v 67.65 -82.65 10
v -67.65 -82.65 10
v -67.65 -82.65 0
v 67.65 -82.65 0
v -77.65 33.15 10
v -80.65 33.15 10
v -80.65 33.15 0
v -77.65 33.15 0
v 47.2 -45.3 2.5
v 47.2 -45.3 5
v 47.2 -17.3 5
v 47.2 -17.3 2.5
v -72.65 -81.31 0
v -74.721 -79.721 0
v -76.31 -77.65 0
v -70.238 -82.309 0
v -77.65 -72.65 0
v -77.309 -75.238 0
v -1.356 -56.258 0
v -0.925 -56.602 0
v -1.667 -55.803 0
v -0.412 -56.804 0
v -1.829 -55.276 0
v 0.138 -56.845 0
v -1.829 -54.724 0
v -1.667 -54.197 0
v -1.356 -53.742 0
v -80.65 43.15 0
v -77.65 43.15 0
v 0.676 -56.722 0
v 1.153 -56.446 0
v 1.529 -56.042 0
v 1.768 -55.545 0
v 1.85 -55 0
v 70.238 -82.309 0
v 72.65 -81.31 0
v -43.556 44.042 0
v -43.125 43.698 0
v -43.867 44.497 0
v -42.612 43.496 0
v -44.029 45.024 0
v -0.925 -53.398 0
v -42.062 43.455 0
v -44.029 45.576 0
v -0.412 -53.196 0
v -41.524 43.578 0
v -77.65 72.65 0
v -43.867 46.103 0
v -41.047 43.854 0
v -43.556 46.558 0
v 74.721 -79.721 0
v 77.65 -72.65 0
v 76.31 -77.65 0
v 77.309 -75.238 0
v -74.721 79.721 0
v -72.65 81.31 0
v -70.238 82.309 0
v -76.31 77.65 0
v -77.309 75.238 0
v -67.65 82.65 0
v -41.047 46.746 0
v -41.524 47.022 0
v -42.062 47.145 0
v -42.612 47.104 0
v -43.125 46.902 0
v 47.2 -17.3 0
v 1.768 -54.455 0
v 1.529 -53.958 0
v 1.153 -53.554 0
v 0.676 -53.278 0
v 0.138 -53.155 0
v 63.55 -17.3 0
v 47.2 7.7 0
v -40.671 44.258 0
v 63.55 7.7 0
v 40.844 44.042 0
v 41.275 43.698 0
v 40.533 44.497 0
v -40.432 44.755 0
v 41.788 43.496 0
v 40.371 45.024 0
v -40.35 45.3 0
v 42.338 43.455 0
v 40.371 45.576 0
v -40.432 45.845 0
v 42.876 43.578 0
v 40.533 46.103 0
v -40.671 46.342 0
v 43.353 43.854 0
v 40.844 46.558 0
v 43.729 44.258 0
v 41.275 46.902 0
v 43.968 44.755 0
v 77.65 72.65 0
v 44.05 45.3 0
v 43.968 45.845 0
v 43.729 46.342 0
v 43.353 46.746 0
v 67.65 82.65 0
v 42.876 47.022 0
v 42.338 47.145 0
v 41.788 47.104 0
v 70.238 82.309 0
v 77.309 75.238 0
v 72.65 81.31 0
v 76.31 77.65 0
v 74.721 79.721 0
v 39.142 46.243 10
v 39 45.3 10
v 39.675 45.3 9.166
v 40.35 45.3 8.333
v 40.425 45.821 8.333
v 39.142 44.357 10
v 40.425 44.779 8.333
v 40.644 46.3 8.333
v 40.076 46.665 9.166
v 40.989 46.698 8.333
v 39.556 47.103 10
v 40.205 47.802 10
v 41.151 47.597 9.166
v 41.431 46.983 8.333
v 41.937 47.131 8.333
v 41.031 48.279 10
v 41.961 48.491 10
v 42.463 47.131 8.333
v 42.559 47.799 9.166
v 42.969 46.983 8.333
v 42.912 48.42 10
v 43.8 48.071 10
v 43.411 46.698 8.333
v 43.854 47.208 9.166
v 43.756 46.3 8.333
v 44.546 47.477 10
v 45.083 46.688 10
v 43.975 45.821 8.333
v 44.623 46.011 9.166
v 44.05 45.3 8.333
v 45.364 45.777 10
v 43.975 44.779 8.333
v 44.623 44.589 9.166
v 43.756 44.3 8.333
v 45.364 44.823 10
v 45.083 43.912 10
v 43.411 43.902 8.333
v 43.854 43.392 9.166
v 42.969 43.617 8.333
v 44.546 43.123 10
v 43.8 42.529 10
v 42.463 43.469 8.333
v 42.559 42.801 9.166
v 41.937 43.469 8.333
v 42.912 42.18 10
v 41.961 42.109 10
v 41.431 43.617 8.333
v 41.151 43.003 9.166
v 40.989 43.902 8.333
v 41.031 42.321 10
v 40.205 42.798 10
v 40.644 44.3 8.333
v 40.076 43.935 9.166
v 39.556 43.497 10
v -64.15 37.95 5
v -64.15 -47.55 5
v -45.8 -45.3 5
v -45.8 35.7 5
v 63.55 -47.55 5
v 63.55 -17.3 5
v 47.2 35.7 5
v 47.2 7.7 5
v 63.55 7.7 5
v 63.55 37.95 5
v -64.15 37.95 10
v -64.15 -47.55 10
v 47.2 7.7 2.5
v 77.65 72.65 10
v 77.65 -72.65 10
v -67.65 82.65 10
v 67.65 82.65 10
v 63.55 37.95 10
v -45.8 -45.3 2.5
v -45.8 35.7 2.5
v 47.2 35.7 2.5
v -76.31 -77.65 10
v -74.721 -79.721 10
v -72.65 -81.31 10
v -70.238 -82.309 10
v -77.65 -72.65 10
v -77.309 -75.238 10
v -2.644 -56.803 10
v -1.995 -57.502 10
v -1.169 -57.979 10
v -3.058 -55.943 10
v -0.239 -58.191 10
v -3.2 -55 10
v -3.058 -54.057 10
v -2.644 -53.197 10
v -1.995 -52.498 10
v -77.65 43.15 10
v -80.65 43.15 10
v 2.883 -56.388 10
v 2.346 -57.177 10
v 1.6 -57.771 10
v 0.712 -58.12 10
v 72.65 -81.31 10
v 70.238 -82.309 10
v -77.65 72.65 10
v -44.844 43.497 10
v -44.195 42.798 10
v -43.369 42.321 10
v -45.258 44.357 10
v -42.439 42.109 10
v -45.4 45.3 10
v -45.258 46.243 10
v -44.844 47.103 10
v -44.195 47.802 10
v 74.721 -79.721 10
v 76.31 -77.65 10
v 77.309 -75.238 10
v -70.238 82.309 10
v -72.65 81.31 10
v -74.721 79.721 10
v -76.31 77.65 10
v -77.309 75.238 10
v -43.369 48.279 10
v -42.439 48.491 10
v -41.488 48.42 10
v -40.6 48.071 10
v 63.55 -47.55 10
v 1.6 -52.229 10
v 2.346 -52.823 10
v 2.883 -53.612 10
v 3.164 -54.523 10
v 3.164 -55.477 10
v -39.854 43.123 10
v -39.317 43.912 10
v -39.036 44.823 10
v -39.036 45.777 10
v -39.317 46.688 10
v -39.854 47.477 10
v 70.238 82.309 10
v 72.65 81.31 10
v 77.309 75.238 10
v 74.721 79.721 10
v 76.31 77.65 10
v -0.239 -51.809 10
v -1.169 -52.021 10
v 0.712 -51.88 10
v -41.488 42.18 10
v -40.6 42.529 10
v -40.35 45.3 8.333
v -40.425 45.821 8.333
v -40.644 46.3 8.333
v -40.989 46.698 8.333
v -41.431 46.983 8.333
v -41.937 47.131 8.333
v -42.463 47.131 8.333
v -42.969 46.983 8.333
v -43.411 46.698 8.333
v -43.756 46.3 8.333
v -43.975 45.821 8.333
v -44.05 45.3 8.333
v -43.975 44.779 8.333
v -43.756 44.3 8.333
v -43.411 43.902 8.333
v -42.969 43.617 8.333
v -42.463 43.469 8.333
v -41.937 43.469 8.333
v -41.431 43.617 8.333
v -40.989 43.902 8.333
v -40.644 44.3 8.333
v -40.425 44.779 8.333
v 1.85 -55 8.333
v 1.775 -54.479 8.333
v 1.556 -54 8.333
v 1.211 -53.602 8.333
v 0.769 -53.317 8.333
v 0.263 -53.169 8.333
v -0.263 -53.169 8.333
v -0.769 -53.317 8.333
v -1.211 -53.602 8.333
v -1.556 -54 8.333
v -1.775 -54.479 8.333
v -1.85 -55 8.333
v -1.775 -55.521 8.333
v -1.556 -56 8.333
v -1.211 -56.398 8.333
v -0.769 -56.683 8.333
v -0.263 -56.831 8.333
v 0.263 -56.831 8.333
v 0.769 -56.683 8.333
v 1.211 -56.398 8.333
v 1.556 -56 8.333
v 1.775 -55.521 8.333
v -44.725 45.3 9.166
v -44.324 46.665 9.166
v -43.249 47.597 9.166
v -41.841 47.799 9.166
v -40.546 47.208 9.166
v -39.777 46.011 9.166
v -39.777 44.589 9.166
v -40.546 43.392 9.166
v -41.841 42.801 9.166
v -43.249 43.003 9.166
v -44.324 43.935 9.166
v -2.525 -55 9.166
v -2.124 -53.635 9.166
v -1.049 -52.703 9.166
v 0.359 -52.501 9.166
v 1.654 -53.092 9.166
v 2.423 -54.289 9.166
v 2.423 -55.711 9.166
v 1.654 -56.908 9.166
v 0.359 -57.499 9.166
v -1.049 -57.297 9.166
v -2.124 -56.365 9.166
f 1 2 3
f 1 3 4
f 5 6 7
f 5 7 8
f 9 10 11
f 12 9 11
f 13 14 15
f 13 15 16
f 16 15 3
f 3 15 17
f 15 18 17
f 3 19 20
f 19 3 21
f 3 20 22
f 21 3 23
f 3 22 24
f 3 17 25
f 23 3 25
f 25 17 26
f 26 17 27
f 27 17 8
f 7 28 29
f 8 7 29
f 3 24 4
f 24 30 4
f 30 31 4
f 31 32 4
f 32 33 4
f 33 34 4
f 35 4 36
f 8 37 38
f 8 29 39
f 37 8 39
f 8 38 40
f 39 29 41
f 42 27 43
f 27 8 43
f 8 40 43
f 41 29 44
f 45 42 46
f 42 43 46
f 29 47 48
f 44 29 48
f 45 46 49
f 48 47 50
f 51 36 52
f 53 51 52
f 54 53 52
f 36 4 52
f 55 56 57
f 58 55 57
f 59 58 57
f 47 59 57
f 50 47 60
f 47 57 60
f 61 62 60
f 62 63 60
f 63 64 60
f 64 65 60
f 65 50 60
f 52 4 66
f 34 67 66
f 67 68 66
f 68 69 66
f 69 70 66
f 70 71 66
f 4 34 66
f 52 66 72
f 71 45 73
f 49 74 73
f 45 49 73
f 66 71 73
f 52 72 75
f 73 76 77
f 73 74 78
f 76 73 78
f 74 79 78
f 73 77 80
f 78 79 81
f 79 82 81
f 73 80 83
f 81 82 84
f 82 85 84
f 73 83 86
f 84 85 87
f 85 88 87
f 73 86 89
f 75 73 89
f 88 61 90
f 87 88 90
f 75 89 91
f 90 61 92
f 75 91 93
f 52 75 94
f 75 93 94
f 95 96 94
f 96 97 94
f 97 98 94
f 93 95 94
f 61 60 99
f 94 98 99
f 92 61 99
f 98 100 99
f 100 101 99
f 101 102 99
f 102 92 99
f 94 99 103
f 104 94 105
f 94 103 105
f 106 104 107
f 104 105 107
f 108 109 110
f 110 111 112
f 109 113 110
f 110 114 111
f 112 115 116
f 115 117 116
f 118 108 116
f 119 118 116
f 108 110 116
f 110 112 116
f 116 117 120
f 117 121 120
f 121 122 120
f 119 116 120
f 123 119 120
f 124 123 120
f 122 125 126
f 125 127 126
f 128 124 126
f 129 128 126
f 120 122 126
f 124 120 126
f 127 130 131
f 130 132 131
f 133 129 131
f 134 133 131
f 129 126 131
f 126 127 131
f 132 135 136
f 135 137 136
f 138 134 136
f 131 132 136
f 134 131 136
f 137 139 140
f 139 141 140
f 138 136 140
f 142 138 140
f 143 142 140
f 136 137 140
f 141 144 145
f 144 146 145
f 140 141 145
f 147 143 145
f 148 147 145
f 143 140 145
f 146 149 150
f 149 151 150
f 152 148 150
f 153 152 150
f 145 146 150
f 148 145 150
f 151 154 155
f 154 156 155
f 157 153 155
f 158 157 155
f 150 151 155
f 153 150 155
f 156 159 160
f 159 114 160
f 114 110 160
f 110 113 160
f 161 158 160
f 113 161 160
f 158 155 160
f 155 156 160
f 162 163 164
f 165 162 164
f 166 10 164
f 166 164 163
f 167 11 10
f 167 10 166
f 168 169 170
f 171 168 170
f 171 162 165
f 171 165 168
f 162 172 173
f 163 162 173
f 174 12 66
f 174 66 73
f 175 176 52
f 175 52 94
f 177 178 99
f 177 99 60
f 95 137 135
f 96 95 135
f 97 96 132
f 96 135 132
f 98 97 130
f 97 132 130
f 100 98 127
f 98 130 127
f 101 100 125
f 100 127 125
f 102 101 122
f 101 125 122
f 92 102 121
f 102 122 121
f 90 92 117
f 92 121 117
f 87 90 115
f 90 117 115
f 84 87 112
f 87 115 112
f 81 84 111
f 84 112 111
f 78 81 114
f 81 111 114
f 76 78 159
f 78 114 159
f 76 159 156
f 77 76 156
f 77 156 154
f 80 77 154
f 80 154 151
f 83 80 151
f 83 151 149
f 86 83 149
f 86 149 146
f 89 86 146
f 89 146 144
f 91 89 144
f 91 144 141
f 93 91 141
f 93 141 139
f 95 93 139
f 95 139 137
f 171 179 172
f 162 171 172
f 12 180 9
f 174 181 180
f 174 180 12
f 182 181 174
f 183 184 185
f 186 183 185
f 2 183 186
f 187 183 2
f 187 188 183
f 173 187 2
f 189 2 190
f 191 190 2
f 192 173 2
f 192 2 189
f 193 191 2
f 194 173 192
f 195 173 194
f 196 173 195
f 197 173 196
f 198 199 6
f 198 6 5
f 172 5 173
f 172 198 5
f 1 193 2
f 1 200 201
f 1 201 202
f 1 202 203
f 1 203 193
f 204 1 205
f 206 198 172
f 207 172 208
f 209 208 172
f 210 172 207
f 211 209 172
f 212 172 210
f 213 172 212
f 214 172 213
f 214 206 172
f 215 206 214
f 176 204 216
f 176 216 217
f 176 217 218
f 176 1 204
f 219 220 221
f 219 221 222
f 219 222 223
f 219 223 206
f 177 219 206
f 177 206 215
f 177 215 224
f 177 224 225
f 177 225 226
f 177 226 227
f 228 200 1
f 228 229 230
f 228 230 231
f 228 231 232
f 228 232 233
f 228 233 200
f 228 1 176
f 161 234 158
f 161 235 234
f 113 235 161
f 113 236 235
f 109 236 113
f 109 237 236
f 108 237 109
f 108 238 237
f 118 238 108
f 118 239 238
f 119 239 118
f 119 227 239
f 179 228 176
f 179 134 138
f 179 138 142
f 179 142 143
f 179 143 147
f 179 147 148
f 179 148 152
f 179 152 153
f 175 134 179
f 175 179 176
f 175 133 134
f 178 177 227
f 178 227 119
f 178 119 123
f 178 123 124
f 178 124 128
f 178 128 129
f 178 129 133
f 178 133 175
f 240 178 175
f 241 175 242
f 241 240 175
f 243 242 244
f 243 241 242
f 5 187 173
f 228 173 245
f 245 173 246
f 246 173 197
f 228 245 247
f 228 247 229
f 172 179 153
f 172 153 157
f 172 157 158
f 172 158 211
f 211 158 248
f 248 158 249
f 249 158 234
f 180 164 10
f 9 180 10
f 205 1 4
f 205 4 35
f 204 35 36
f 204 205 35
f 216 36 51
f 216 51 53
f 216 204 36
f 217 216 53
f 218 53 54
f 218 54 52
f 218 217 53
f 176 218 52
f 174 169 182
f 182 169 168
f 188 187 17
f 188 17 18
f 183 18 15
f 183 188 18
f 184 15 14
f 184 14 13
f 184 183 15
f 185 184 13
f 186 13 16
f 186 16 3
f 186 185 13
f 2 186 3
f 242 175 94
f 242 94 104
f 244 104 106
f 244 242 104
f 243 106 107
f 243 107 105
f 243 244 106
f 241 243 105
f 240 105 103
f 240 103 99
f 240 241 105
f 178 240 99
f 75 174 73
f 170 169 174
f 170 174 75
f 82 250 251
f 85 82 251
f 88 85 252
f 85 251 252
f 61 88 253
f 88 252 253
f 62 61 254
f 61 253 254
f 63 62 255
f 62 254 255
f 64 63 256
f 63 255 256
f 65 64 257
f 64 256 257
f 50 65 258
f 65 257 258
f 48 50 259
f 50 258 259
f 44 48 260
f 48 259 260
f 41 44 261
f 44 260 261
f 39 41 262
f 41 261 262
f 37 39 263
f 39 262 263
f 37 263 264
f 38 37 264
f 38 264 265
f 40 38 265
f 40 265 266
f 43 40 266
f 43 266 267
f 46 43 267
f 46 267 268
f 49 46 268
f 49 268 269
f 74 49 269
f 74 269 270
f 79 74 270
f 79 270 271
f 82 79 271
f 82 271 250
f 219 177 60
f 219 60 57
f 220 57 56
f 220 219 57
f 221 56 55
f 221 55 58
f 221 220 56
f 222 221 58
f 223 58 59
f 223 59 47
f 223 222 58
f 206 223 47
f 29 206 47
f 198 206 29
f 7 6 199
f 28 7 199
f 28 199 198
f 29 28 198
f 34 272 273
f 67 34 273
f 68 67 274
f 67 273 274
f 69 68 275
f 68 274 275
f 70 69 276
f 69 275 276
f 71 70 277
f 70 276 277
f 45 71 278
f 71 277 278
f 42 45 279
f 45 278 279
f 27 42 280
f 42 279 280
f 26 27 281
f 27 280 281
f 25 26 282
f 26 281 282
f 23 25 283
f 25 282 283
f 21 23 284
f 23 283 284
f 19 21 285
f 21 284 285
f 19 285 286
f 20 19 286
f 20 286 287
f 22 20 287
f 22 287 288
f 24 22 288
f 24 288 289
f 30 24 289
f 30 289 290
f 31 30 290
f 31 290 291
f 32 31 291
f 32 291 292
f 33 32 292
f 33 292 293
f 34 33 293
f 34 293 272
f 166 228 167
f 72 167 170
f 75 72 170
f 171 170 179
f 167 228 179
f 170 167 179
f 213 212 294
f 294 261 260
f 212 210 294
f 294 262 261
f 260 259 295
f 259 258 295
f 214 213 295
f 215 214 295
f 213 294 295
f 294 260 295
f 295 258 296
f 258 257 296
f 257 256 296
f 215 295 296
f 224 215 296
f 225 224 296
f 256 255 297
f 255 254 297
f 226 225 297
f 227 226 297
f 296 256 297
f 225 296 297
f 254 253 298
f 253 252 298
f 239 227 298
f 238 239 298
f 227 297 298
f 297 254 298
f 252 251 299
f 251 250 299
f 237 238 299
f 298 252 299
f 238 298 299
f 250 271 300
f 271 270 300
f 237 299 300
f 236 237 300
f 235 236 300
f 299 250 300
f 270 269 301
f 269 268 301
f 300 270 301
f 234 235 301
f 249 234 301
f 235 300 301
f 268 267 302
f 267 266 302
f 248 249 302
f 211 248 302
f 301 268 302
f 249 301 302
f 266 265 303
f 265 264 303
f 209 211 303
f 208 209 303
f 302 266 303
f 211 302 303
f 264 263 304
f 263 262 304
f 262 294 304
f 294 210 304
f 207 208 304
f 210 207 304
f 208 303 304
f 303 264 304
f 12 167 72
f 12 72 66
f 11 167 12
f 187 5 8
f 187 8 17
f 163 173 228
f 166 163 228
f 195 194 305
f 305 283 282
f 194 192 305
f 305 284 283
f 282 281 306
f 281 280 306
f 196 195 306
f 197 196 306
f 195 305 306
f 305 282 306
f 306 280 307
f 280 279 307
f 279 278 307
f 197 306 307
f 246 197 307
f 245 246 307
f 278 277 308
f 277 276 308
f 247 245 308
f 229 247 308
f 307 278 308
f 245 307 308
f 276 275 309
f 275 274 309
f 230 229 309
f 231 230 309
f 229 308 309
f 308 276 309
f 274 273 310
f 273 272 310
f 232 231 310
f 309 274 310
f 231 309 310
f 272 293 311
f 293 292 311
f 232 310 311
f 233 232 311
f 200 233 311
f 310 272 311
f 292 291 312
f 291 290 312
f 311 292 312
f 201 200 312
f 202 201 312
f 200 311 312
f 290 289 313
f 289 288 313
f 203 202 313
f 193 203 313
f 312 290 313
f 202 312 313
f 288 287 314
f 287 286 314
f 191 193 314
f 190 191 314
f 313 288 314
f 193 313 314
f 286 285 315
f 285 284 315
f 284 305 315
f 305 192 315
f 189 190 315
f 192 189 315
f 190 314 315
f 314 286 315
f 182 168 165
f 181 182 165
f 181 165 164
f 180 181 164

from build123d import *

# Parameters (mm, degrees)
F2_R           = 1.85
F2_W           = 3
F2_H           = 10
F3_DEPTH       = 10
F4_DEPTH       = 5
F5_DEPTH       = 7.5
F6_D           = 3.7
F6_CSINK_D     = 6.4
F6_CSINK_ANGLE = 78


with BuildPart() as f3:
    # F2 (on offset) → F3 (new body)
    with BuildSketch(Plane.XY.offset(10)):
        with BuildLine():
            ThreePointArc((77.65, 72.65), (74.7210678119, 79.7210678119), (67.65, 82.65))
            Line((67.65, 82.65), (-67.65, 82.65))
            ThreePointArc((-67.65, 82.65), (-74.7210678119, 79.7210678119), (-77.65, 72.65))
            Line((-77.65, 72.65), (-77.65, 43.15))
            Line((-77.65, 43.15), (-77.65, 33.15))
            Line((-77.65, 33.15), (-77.65, -72.65))
            ThreePointArc((-77.65, -72.65), (-74.7210678119, -79.7210678119), (-67.65, -82.65))
            Line((-67.65, -82.65), (67.65, -82.65))
            ThreePointArc((67.65, -82.65), (74.7210678119, -79.7210678119), (77.65, -72.65))
            Line((77.65, -72.65), (77.65, 72.65))
        make_face()
        with Locations((0, -55)):
            Circle(F2_R, mode=Mode.SUBTRACT)
        Polygon((-64.15, -47.55), (-64.15, 37.95), (63.55, 37.95), (63.55, 7.7), (63.55, -17.3), (63.55, -47.55), align=None, mode=Mode.SUBTRACT)
        with Locations((-42.2, 45.3)):
            Circle(F2_R, mode=Mode.SUBTRACT)
        with Locations((42.2, 45.3)):
            Circle(F2_R, mode=Mode.SUBTRACT)
        Polygon((63.55, 37.95), (-64.15, 37.95), (-64.15, -47.55), (63.55, -47.55), (63.55, -17.3), (47.2, -17.3), (47.2, -45.3), (-45.8, -45.3), (-45.8, 35.7), (47.2, 35.7), (47.2, 7.7), (63.55, 7.7), align=None)
        with Locations((-79.15, 38.15)):
            Rectangle(F2_W, F2_H)
        Polygon((47.2, -17.3), (47.2, 7.7), (47.2, 35.7), (-45.8, 35.7), (-45.8, -45.3), (47.2, -45.3), align=None)
    extrude(amount=-F3_DEPTH)

    # F2 (on offset) → F4 (cut)
    with BuildSketch(Plane.XY.offset(10)):
        Polygon((63.55, 37.95), (-64.15, 37.95), (-64.15, -47.55), (63.55, -47.55), (63.55, -17.3), (47.2, -17.3), (47.2, -45.3), (-45.8, -45.3), (-45.8, 35.7), (47.2, 35.7), (47.2, 7.7), (63.55, 7.7), align=None)
    extrude(amount=-F4_DEPTH, mode=Mode.SUBTRACT)

    # F2 (on offset) → F5 (cut)
    with BuildSketch(Plane.XY.offset(10)):
        Polygon((47.2, -17.3), (47.2, 7.7), (47.2, 35.7), (-45.8, 35.7), (-45.8, -45.3), (47.2, -45.3), align=None)
    extrude(amount=-F5_DEPTH, mode=Mode.SUBTRACT)

    # F6 (through all)
    with Locations(Plane.XY.offset(10)):
        with Locations((-42.2, 45.3), (42.2, 45.3), (0, -55)):
            CounterSinkHole(F6_D / 2, F6_CSINK_D / 2, counter_sink_angle=F6_CSINK_ANGLE)


solid = f3.part
